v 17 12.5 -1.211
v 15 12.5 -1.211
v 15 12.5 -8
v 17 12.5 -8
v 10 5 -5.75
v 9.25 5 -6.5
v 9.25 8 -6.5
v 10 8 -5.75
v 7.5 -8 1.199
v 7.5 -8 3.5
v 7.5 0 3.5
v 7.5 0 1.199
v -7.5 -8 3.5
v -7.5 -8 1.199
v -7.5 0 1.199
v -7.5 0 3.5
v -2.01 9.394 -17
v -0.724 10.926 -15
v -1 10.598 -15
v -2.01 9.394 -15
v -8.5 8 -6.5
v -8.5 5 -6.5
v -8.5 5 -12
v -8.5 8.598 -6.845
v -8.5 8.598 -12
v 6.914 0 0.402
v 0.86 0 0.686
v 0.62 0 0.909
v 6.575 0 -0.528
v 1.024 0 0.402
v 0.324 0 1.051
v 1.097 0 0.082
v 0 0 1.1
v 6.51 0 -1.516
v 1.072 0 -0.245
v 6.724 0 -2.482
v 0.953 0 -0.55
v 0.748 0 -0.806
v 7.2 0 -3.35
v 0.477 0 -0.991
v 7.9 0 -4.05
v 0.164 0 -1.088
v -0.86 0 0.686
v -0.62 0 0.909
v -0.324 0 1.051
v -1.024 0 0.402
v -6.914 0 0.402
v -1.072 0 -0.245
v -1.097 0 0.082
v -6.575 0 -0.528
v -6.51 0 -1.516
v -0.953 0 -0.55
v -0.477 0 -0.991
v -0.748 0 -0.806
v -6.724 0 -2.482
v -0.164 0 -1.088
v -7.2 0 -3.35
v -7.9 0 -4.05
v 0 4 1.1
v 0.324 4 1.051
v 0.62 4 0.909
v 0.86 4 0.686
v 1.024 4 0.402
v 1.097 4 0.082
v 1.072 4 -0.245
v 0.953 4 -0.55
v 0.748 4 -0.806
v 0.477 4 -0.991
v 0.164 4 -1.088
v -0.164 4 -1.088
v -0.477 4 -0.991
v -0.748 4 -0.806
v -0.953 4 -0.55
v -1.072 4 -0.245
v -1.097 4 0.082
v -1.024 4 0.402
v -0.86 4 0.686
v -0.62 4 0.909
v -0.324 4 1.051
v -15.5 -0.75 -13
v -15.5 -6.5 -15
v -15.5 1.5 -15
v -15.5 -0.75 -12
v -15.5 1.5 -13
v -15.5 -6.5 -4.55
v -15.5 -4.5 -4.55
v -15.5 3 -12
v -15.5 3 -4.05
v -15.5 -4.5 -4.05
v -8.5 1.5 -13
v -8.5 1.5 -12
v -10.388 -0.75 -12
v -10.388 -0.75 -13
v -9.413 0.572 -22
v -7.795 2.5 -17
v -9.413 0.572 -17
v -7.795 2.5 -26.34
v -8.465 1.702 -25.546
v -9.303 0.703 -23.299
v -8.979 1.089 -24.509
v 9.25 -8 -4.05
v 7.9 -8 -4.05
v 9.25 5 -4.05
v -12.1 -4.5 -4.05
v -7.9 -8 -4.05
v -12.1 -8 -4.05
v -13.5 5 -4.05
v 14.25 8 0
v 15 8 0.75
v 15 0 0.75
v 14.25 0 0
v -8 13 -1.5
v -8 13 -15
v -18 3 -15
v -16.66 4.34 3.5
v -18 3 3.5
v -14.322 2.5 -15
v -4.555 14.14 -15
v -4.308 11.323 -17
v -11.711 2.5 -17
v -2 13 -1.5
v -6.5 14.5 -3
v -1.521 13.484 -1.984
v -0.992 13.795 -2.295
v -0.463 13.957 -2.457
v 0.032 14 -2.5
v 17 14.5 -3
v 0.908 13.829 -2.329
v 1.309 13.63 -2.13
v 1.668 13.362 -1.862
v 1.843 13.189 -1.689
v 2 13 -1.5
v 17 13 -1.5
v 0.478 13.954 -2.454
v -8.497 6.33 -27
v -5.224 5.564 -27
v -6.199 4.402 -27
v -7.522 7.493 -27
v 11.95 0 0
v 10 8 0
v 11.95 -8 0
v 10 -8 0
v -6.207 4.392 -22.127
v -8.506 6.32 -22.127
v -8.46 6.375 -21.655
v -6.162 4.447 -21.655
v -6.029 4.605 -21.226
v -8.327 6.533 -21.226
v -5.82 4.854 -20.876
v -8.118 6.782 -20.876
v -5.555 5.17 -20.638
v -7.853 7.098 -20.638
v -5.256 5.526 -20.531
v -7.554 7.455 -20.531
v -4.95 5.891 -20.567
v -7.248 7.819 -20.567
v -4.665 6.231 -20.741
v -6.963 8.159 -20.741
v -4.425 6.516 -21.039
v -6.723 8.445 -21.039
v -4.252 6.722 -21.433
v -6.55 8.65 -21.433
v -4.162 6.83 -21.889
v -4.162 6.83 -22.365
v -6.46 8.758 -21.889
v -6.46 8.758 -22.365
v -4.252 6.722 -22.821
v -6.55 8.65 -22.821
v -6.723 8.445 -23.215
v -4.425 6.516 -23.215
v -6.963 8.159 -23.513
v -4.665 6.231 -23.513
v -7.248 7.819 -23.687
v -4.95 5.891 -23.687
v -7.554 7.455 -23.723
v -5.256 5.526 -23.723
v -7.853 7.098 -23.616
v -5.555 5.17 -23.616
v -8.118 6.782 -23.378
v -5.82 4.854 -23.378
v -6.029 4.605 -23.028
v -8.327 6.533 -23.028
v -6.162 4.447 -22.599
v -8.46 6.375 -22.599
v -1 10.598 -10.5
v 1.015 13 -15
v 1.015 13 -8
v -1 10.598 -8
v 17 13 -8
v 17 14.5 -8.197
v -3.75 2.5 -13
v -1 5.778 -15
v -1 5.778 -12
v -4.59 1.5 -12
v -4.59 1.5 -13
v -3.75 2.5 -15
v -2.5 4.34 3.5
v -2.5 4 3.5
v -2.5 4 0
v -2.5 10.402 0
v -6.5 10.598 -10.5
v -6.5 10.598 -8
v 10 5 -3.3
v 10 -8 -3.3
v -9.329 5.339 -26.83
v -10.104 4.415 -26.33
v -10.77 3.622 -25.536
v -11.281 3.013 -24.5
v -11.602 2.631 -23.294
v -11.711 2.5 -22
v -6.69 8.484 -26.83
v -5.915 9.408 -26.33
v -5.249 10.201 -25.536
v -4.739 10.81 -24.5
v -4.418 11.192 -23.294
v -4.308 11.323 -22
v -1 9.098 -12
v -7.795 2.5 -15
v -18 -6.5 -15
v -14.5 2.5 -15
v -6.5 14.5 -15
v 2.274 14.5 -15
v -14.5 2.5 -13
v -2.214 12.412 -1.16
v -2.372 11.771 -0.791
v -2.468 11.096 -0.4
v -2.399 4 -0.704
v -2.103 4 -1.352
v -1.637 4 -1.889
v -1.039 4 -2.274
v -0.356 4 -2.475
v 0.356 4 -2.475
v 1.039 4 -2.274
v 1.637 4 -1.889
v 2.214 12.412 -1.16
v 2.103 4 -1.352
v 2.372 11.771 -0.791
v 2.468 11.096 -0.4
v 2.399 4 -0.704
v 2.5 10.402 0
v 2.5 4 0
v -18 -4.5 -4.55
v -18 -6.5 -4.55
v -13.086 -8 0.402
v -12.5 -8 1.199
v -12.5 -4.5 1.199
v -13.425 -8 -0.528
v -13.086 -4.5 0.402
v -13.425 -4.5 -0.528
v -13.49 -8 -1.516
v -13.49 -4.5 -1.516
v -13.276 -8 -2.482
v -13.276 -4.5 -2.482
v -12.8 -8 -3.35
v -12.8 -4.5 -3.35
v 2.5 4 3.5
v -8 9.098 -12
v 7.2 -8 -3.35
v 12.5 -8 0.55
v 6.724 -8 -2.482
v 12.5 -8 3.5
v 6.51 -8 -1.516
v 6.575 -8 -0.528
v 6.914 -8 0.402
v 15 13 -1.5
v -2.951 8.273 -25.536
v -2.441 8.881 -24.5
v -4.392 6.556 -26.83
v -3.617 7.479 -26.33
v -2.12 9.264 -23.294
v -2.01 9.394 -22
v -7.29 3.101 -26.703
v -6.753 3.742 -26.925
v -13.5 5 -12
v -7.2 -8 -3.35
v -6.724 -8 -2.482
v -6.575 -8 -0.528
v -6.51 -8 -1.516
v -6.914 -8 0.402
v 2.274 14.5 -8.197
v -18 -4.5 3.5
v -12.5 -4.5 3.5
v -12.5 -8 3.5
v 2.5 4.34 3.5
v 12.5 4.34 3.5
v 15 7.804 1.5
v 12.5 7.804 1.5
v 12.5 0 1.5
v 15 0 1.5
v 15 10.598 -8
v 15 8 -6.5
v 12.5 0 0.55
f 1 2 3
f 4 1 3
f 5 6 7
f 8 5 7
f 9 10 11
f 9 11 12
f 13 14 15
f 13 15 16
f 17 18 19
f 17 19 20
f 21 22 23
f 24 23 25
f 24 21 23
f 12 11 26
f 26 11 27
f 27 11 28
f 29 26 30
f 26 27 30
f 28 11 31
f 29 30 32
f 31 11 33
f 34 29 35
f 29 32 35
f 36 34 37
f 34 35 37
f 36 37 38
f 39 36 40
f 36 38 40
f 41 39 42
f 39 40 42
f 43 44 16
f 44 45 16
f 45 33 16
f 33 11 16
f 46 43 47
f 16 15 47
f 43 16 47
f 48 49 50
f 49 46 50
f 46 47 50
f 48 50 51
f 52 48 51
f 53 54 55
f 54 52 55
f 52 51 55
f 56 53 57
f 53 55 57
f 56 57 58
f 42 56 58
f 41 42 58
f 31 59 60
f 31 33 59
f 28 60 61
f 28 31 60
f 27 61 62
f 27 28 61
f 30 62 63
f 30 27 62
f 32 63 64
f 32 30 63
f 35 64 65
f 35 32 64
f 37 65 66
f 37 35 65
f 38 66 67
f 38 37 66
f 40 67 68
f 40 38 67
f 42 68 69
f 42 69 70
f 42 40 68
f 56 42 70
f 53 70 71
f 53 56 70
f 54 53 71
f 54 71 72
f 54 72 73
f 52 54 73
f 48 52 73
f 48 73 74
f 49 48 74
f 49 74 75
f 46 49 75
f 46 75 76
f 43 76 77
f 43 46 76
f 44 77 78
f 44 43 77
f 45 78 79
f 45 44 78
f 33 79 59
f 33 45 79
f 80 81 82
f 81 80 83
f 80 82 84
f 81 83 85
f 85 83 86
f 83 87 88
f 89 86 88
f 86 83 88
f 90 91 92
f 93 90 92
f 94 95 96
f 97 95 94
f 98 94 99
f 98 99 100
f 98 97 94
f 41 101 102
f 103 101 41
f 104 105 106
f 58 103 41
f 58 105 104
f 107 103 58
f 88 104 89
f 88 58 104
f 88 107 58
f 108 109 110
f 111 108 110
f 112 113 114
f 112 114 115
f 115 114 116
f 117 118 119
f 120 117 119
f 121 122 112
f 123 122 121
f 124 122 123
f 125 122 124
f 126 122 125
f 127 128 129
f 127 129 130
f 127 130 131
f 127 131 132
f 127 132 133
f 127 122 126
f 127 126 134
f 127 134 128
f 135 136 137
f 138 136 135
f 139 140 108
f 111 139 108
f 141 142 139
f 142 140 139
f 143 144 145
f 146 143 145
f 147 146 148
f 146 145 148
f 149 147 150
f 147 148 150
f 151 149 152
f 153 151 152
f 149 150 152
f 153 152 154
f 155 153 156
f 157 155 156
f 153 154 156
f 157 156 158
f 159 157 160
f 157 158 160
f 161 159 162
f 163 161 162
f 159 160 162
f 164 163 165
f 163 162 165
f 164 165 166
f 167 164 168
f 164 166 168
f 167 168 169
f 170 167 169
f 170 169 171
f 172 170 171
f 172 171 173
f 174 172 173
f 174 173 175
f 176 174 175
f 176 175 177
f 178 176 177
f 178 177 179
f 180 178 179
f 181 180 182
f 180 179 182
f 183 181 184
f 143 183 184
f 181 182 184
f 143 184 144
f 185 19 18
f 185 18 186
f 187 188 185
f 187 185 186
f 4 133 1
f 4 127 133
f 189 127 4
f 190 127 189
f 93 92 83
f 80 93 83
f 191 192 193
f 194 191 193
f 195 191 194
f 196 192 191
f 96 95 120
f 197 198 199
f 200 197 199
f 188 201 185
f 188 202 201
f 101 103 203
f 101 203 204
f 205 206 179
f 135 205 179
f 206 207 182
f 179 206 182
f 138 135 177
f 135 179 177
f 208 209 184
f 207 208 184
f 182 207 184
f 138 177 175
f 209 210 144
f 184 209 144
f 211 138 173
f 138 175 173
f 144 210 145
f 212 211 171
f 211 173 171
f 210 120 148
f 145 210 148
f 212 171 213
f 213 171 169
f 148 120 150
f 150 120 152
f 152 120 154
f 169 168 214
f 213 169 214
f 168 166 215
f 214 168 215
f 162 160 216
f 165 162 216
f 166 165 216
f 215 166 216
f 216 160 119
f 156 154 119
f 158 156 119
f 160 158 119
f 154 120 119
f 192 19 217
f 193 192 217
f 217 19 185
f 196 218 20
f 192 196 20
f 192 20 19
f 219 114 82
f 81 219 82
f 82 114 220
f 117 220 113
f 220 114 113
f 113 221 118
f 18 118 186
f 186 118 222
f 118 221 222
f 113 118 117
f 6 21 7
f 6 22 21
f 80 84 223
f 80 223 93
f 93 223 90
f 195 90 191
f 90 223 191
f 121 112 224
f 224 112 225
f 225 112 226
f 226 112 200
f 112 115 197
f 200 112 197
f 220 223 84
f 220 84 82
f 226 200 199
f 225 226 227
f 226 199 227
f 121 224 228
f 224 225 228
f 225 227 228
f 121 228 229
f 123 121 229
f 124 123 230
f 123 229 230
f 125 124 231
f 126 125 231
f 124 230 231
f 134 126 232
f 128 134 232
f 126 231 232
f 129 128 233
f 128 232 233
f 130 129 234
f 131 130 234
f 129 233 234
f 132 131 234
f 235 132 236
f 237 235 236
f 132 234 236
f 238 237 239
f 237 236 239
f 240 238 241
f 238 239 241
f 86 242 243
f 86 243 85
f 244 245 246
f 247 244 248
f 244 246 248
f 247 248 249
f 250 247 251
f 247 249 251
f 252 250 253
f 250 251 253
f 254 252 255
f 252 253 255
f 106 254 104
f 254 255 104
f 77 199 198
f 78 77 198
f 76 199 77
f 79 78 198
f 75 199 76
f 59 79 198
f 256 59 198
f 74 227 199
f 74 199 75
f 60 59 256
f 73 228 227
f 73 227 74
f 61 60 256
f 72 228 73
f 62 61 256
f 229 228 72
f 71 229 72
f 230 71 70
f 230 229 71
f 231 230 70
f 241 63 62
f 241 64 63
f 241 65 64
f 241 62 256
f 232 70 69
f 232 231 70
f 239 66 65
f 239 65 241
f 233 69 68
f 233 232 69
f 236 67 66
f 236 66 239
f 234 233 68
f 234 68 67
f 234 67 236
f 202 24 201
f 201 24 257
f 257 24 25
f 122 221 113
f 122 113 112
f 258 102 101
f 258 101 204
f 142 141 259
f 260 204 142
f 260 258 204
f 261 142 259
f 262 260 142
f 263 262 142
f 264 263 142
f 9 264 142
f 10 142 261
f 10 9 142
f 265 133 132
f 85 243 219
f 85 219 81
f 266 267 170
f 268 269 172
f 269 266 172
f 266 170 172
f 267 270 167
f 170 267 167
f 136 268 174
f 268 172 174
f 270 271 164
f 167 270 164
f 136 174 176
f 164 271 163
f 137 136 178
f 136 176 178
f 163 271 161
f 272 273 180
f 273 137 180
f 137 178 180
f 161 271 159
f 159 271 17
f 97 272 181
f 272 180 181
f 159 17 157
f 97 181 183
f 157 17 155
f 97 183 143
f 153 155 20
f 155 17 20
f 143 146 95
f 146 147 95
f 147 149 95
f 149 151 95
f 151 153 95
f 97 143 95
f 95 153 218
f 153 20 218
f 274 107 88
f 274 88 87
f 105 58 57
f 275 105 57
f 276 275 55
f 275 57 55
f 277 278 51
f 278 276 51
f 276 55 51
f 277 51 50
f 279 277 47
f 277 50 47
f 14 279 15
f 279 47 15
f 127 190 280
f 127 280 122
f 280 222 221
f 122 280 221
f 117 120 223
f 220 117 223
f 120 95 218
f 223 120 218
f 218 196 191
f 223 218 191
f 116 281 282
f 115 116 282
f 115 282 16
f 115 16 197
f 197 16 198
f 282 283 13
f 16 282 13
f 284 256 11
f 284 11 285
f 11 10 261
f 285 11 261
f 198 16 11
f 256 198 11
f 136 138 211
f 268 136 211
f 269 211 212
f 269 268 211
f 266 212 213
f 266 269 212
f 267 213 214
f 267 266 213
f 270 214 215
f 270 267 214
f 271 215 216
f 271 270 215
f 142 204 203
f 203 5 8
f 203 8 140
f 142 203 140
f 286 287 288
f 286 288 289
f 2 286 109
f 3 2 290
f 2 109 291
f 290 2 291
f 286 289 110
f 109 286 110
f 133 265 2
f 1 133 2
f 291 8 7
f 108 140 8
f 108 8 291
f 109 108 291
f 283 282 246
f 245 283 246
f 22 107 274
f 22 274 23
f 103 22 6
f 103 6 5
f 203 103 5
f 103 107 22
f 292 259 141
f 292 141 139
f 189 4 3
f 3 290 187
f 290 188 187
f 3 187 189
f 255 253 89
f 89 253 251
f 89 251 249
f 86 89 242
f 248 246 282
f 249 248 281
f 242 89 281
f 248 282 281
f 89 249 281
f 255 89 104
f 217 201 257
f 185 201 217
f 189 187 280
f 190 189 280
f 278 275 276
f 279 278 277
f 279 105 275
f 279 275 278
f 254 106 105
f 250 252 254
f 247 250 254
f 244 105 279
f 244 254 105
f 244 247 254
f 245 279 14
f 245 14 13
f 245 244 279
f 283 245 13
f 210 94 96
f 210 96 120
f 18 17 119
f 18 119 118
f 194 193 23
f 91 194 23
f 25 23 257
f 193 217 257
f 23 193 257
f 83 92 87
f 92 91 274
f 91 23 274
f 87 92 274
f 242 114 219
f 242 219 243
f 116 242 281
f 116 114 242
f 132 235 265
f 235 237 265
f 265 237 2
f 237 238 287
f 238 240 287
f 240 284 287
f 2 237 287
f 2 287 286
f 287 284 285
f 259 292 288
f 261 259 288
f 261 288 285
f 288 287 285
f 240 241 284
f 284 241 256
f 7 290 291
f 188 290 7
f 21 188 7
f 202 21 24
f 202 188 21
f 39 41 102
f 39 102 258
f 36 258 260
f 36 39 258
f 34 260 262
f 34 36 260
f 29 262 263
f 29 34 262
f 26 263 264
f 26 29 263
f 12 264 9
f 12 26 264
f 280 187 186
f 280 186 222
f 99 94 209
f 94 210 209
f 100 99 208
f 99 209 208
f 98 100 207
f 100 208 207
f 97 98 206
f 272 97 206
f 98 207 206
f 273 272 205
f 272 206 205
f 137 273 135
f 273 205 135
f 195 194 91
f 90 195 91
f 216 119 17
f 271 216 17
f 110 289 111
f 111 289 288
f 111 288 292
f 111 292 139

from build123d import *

# Parameters (mm, degrees)
SKETCH_1_W                      = 28
SKETCH_1_H                      = 11.5
SKETCH_1_R                      = 1.1
EXTRUDE_1_DEPTH                 = 3
SKETCH_2_R                      = 3.5
EXTRUDE_2_DEPTH                 = 8
CUT_EXTRUDE_1_DEPTH             = 22.260291625
CUT_EXTRUDE_1_DEPTH_BACK        = 22.260291625
SKETCH_3_W                      = 25.5
SKETCH_3_H                      = 3.95
EXTRUDE_3_DEPTH                 = 3
SKETCH_5_W                      = 3.5
SKETCH_5_H                      = 3
EXTRUDE_4_DEPTH                 = 2
EXTRUDE_5_DEPTH                 = 5
EXTRUDE_6_DEPTH                 = 5
SKETCH_8_W                      = 25.5
SKETCH_8_H                      = 3.95
EXTRUDE_7_DEPTH                 = 3
EXTRUDE_8_DEPTH                 = 4.5
SKETCH_10_W                     = 2.5
SKETCH_10_H                     = 17.5
EXTRUDE_9_DEPTH                 = 7
SKETCH_11_W                     = 25.5
SKETCH_11_H                     = 1.5
CUT_EXTRUDE_2_DEPTH             = 3
CHAMFER_1_SIZE                  = 1.5
CHAMFER_1_SIZE2                 = 2.598076211
EXTRUDE_10_REACH                = 31.245
EXTRUDE_10_DIRECTION_2_REACH    = 31.245
SKETCH_13_W                     = 3.5
SKETCH_13_H                     = 8
CUT_EXTRUDE_3_DEPTH             = 0.3
CHAMFER_2_SIZE                  = 0.75
SKETCH_14_W                     = 2.5
SKETCH_14_H                     = 2
CUT_EXTRUDE_4_DEPTH             = 30.244657632
CUT_EXTRUDE_4_DIRECTION_2_REACH = 31.245
CUT_EXTRUDE_5_REACH             = 29.663
SKETCH_15_W                     = 2.5
SKETCH_15_H                     = 8
SKETCH_16_R                     = 1.1
EXTRUDE_11_DEPTH                = 1
EXTRUDE_12_DEPTH                = 8.5
SKETCH_20_W                     = 7.5
SKETCH_20_H                     = 3
EXTRUDE_14_DEPTH                = 5.598076211
EXTRUDE_15_DEPTH                = 3
CUT_EXTRUDE_6_DEPTH             = 2
SKETCH_24_W                     = 2.5
SKETCH_24_H                     = 10.45
EXTRUDE_16_DEPTH                = 2
CUT_EXTRUDE_7_REACH             = 29.663
SKETCH_25_W                     = 13.241350553
SKETCH_25_H                     = 2
CHAMFER_3_SIZE                  = 1.5
CHAMFER_5_SIZE                  = 5
CHAMFER_5_SIZE2                 = 8.660254038
CHAMFER_6_SIZE                  = 10
CHAMFER_7_SIZE                  = 2
CHAMFER_8_SIZE                  = 2
EXTRUDE_17_DEPTH                = 1.5
EXTRUDE_21_DEPTH                = 2
EXTRUDE_18_DEPTH                = 2
CHAMFER_9_SIZE                  = 1.5
EXTRUDE_19_DEPTH                = 15.984546635
EXTRUDE_20_REACH                = 31.606
CUT_EXTRUDE_8_REACH             = 31.606
EXTRUDE_22_DEPTH                = 12
SKETCH_36_R                     = 1.6
CUT_EXTRUDE_9_DEPTH             = 3
EXTRUDE_23_DEPTH                = 10
FILLET_1_R                      = 5


# Some blends are built 0.0001 mm under size
with BuildPart() as part:
    # 草图1 → 凸台-拉伸1 (new body)
    with BuildSketch(Plane(origin=(0, 0, 0), x_dir=(1, 0, 0), z_dir=(0, 1, 0))):
        with Locations((-4, 2.25)):
            Rectangle(SKETCH_1_W, SKETCH_1_H)
        with Locations(Location((0, 0, 0), (0, 0, 270))):
            Circle(SKETCH_1_R, mode=Mode.SUBTRACT)
    extrude(amount=EXTRUDE_1_DEPTH)

    # 草图2 → 凸台-拉伸2 (add)
    with BuildSketch(Plane.XZ):
        with Locations(Location((-10, -1.25, 0), (0, 0, 90))):
            Circle(SKETCH_2_R)
        with BuildLine():
            Line((10, 2.25), (10, -4.75))
            ThreePointArc((10, -4.75), (6.5, -1.25), (10, 2.25))
        make_face()
    extrude(amount=EXTRUDE_2_DEPTH)

    # 草图3 → 切除-拉伸1 (cut, two sides: drawn at the far end of the back side and taken through both)
    with BuildSketch(Plane.XZ.offset(-CUT_EXTRUDE_1_DEPTH_BACK)):
        with Locations((-2.75, -6.025)):
            Rectangle(SKETCH_3_W, SKETCH_3_H)
    extrude(amount=CUT_EXTRUDE_1_DEPTH + CUT_EXTRUDE_1_DEPTH_BACK, mode=Mode.SUBTRACT)

    # 草图4 → 凸台-拉伸3 (add)
    with BuildSketch(Plane(origin=(10, 0, 0), x_dir=(0, 0, -1), z_dir=(1, 0, 0))):
        Polygon((0, 3), (0, -8), (-2.25, -8), (-2.25, 0), (-3.5, 0), (-3.5, 3), align=None)
    extrude(amount=EXTRUDE_3_DEPTH)

    # 草图5 → 凸台-拉伸4 (add)
    with BuildSketch(Plane(origin=(13, 0, 0), x_dir=(0, 0, -1), z_dir=(1, 0, 0))):
        with Locations((-1.75, 1.5)):
            Rectangle(SKETCH_5_W, SKETCH_5_H)
    extrude(amount=EXTRUDE_4_DEPTH)

    # 草图6 → 凸台-拉伸5 (add)
    with BuildSketch(Plane(origin=(0, 3, 0), x_dir=(1, 0, 0), z_dir=(0, 1, 0))):
        with BuildLine():
            Line((-2.5, 0), (-2.5, -3.5))
            Line((-2.5, -3.5), (-18, -3.5))
            Line((-18, -3.5), (-18, 8))
            Line((-18, 8), (-15.5, 8))
            Line((-15.5, 8), (-15.5, 4.05))
            Line((-15.5, 4.05), (10, 4.05))
            Line((10, 4.05), (10, 0))
            Line((10, 0), (15, 0))
            Line((15, 0), (15, -3.5))
            Line((15, -3.5), (2.5, -3.5))
            Line((2.5, -3.5), (2.5, 0))
            ThreePointArc((2.5, 0), (0, 2.5), (-2.5, 0))
        make_face()
    extrude(amount=EXTRUDE_5_DEPTH)

    # 草图7 → 凸台-拉伸6 (add)
    with BuildSketch(Plane(origin=(0, 8, 0), x_dir=(1, 0, 0), z_dir=(0, 1, 0))):
        with BuildLine():
            Line((10, 0), (10, 4.05))
            Line((10, 4.05), (-15.5, 4.05))
            Line((-15.5, 4.05), (-15.5, 8))
            Line((-15.5, 8), (-18, 8))
            Line((-18, 8), (-18, -3.5))
            Line((-18, -3.5), (-2.5, -3.5))
            Line((-2.5, -3.5), (-2.5, 0))
            ThreePointArc((-2.5, 0), (0, 2.5), (2.5, 0))
            Line((2.5, 0), (2.5, -3.5))
            Line((2.5, -3.5), (15, -3.5))
            Line((15, -3.5), (15, 0))
            Line((15, 0), (10, 0))
        make_face()
        Polygon((10, 0), (15, 0), (15, 8), (-15.5, 8), (-15.5, 4.05), (10, 4.05), align=None)
    extrude(amount=EXTRUDE_6_DEPTH)

    # 草图8 → 凸台-拉伸7 (add)
    with BuildSketch(Plane.XZ.offset(-8)):
        with Locations((-2.75, -6.025)):
            Rectangle(SKETCH_8_W, SKETCH_8_H)
    extrude(amount=EXTRUDE_7_DEPTH)

    # 草图9 → 凸台-拉伸8 (add)
    with BuildSketch(Plane.XZ):
        with BuildLine():
            Line((-12.1, -4.05), (-15.5, -4.05))
            Line((-15.5, -4.05), (-15.5, -8))
            Line((-15.5, -8), (-18, -8))
            Line((-18, -8), (-18, -4.05))
            Line((-18, -4.05), (-18, 3.5))
            Line((-18, 3.5), (-7.5, 3.5))
            Line((-7.5, 3.5), (-7.5, 1.199489743))
            ThreePointArc((-7.5, 1.199489743), (-12.632353631, 1.056667371), (-12.1, -4.05))
        make_face()
    extrude(amount=EXTRUDE_8_DEPTH)

    # 草图10 → 凸台-拉伸9 (add)
    with BuildSketch(Plane(origin=(0, 0, -8), x_dir=(-1, 0, 0), z_dir=(0, 0, -1))):
        with Locations((16.75, 4.25)):
            Rectangle(SKETCH_10_W, SKETCH_10_H)
    extrude(amount=EXTRUDE_9_DEPTH)

    # 草图11 → 切除-拉伸2 (cut)
    with BuildSketch(Plane.XZ.offset(-5)):
        with Locations((-2.75, -7.25)):
            Rectangle(SKETCH_11_W, SKETCH_11_H)
    extrude(amount=-CUT_EXTRUDE_2_DEPTH, mode=Mode.SUBTRACT)

    # 倒角1
    chamfer_1_edges = [part.edges().sort_by_distance(p)[0] for p in [
        (-0.25, 8, -8),
    ]]
    chamfer_1_side = [part.faces().sort_by_distance(p)[0] for p in [
        (-15.184682699, 8, -7.25),
    ]]
    chamfer(chamfer_1_edges, length=CHAMFER_1_SIZE, length2=CHAMFER_1_SIZE2, reference=chamfer_1_side[0])

    # 凸台-拉伸10: up to this face of the body (flat: up to its plane)
    extrude_10_end = Plane(part.part.faces().sort_by_distance((-10, -8, -1.080764101))[0])
    # 草图12 → 凸台-拉伸10 (add, up to the picked face)
    with BuildSketch(Plane.XZ.offset(4.5), mode=Mode.PRIVATE) as extrude_10_sk1:
        with BuildLine():
            Line((-12.5, 3.5), (-12.5, 1.199489743))
            ThreePointArc((-12.5, 1.199489743), (-10, 2.25), (-7.5, 1.199489743))
            Line((-7.5, 1.199489743), (-7.5, 3.5))
            Line((-7.5, 3.5), (-12.5, 3.5))
        make_face()
    extrude_10_tool1 = split(extrude(extrude_10_sk1.sketch, amount=EXTRUDE_10_REACH, mode=Mode.PRIVATE), bisect_by=extrude_10_end, keep=Keep.BOTH, mode=Mode.PRIVATE)
    # 草图12 → 凸台-拉伸10 (add, up to the picked face)
    with BuildSketch(Plane.XZ.offset(4.5), mode=Mode.PRIVATE) as extrude_10_sk2:
        with BuildLine():
            Line((7.5, 3.5), (7.5, 1.199489743))
            ThreePointArc((7.5, 1.199489743), (8.644126499, 1.976702194), (10, 2.25))
            Line((10, 2.25), (12.5, 2.25))
            Line((12.5, 2.25), (13, 2.25))
            Line((13, 2.25), (13, 3.5))
            Line((13, 3.5), (12.5, 3.5))
            Line((12.5, 3.5), (7.5, 3.5))
        make_face()
    extrude_10_tool2 = split(extrude(extrude_10_sk2.sketch, amount=EXTRUDE_10_REACH, mode=Mode.PRIVATE), bisect_by=extrude_10_end, keep=Keep.BOTH, mode=Mode.PRIVATE)
    add(extrude_10_tool1.solids().sort_by(Axis((-10, -4.5, 2.682619), (0, -1, 0)))[0])
    add(extrude_10_tool2.solids().sort_by(Axis((10.022618, -4.5, 2.776432), (0, -1, 0)))[0])

    # 凸台-拉伸10 direction 2: up to this face of the body (flat: up to its plane)
    extrude_10_direction_2_end = Plane(part.part.faces().sort_by_distance((1.489654817, 0, 0.088188875))[0])
    # 草图12 → 凸台-拉伸10 direction 2 (add, up to the picked face)
    with BuildSketch(Plane.XZ.offset(4.5), mode=Mode.PRIVATE) as extrude_10_direction_2_sk1:
        with BuildLine():
            Line((-12.5, 3.5), (-12.5, 1.199489743))
            ThreePointArc((-12.5, 1.199489743), (-10, 2.25), (-7.5, 1.199489743))
            Line((-7.5, 1.199489743), (-7.5, 3.5))
            Line((-7.5, 3.5), (-12.5, 3.5))
        make_face()
    extrude_10_direction_2_tool1 = split(extrude(extrude_10_direction_2_sk1.sketch, amount=-EXTRUDE_10_DIRECTION_2_REACH, mode=Mode.PRIVATE), bisect_by=extrude_10_direction_2_end, keep=Keep.BOTH, mode=Mode.PRIVATE)
    # 草图12 → 凸台-拉伸10 direction 2 (add, up to the picked face)
    with BuildSketch(Plane.XZ.offset(4.5), mode=Mode.PRIVATE) as extrude_10_direction_2_sk2:
        with BuildLine():
            Line((7.5, 3.5), (7.5, 1.199489743))
            ThreePointArc((7.5, 1.199489743), (8.644126499, 1.976702194), (10, 2.25))
            Line((10, 2.25), (12.5, 2.25))
            Line((12.5, 2.25), (13, 2.25))
            Line((13, 2.25), (13, 3.5))
            Line((13, 3.5), (12.5, 3.5))
            Line((12.5, 3.5), (7.5, 3.5))
        make_face()
    extrude_10_direction_2_tool2 = split(extrude(extrude_10_direction_2_sk2.sketch, amount=-EXTRUDE_10_DIRECTION_2_REACH, mode=Mode.PRIVATE), bisect_by=extrude_10_direction_2_end, keep=Keep.BOTH, mode=Mode.PRIVATE)
    add(extrude_10_direction_2_tool1.solids().sort_by(Axis((-10, -4.5, 2.682619), (0, 1, 0)))[0])
    add(extrude_10_direction_2_tool2.solids().sort_by(Axis((10.022618, -4.5, 2.776432), (0, 1, 0)))[0])

    # 草图13 → 切除-拉伸3 (cut)
    with BuildSketch(Plane(origin=(13, 0, 0), x_dir=(0, 0, -1), z_dir=(1, 0, 0))):
        with Locations((-1.75, -4)):
            Rectangle(SKETCH_13_W, SKETCH_13_H)
    extrude(amount=-CUT_EXTRUDE_3_DEPTH, mode=Mode.SUBTRACT)

    # 倒角2
    chamfer_2_edges = [part.edges().sort_by_distance(p)[0] for p in [
        (10, -1.5, -4.05),
        (10, 6.5, -6.5),
        (12.7, -4, 0),
        (15, 4, 0),
    ]]
    chamfer(chamfer_2_edges, length=CHAMFER_2_SIZE)

    # 草图14 → 切除-拉伸4 (cut)
    with BuildSketch(Plane.XZ.offset(4.5)):
        with Locations((13.75, 2.5)):
            Rectangle(SKETCH_14_W, SKETCH_14_H)
    extrude(amount=-CUT_EXTRUDE_4_DEPTH, mode=Mode.SUBTRACT)

    # 草图14 → 切除-拉伸4 direction 2 (cut, up to next)
    with BuildSketch(Plane.XZ.offset(4.5), mode=Mode.PRIVATE) as cut_extrude_4_direction_2_sk1:
        with Locations((13.75, 2.5)):
            Rectangle(SKETCH_14_W, SKETCH_14_H)
    cut_extrude_4_direction_2_tool1 = extrude(cut_extrude_4_direction_2_sk1.sketch, amount=CUT_EXTRUDE_4_DIRECTION_2_REACH, mode=Mode.PRIVATE) & part.part
    add(cut_extrude_4_direction_2_tool1.solids().sort_by_distance((13.75, -4.5, 2.5))[0], mode=Mode.SUBTRACT)

    # 草图15 → 切除-拉伸5 (cut, up to next)
    with BuildSketch(Plane.XY.offset(1.5), mode=Mode.PRIVATE) as cut_extrude_5_sk1:
        with Locations((13.75, -4)):
            Rectangle(SKETCH_15_W, SKETCH_15_H)
    cut_extrude_5_tool1 = extrude(cut_extrude_5_sk1.sketch, amount=-CUT_EXTRUDE_5_REACH, mode=Mode.PRIVATE) & part.part
    add(cut_extrude_5_tool1.solids().sort_by_distance((13.75, -4, 1.5))[0], mode=Mode.SUBTRACT)

    # 草图16 → 凸台-拉伸11 (add)
    with BuildSketch(Plane(origin=(0, 3, 0), x_dir=(1, 0, 0), z_dir=(0, 1, 0))):
        with BuildLine():
            Line((2.5, -3.5), (2.5, 0))
            ThreePointArc((2.5, 0), (0, 2.5), (-2.5, 0))
            Line((-2.5, 0), (-2.5, -3.5))
            Line((-2.5, -3.5), (2.5, -3.5))
        make_face()
        with Locations(Location((0, 0, 0), (0, 0, 270))):
            Circle(SKETCH_16_R, mode=Mode.SUBTRACT)
    extrude(amount=EXTRUDE_11_DEPTH)

    # 草图18 → 凸台-拉伸12 (add)
    with BuildSketch(Plane(origin=(0, 0, -6.5), x_dir=(-1, 0, 0), z_dir=(0, 0, -1))):
        Polygon((15.5, 5), (8.5, 5), (8.5, 10.598076211), (1, 10.598076211), (-1.015453365, 13), (1, 13), (15.5, 13), align=None)
    extrude(amount=EXTRUDE_12_DEPTH)

    # 草图20 → 凸台-拉伸14 (add)
    with BuildSketch(Plane.XZ.offset(-10.598076211)):
        with Locations((-4.75, -13.5)):
            Rectangle(SKETCH_20_W, SKETCH_20_H)
    extrude(amount=EXTRUDE_14_DEPTH)

    # 草图21 → 凸台-拉伸15 (add)
    with BuildSketch(Plane.XY.offset(-12)):
        Polygon((-1, 5), (-3.936848709, 1.5), (-8.5, 1.5), (-10.38797417, -0.75), (-15.5, -0.75), (-15.5, 1.5), (-15.5, 5), align=None)
    extrude(amount=-EXTRUDE_15_DEPTH)

    # 草图23 → 切除-拉伸6 (cut)
    with BuildSketch(Plane(origin=(0, 0, -15), x_dir=(-1, 0, 0), z_dir=(0, 0, -1))):
        Polygon((8.5, 1.5), (15.5, 1.5), (15.5, -0.75), (10.38797417, -0.75), align=None)
    extrude(amount=-CUT_EXTRUDE_6_DEPTH, mode=Mode.SUBTRACT)

    # 草图24 → 凸台-拉伸16 (add)
    with BuildSketch(Plane.XZ.offset(4.5)):
        with Locations((-16.75, -9.775)):
            Rectangle(SKETCH_24_W, SKETCH_24_H)
    extrude(amount=EXTRUDE_16_DEPTH)

    # 草图25 → 切除-拉伸7 (cut, up to next)
    with BuildSketch(Plane(origin=(0, 0, -13), x_dir=(-1, 0, 0), z_dir=(0, 0, -1)), mode=Mode.PRIVATE) as cut_extrude_7_sk1:
        with Locations((8.879324724, 2.5)):
            Rectangle(SKETCH_25_W, SKETCH_25_H)
    cut_extrude_7_tool1 = extrude(cut_extrude_7_sk1.sketch, amount=CUT_EXTRUDE_7_REACH, mode=Mode.PRIVATE) & part.part
    add(cut_extrude_7_tool1.solids().sort_by_distance((-8.879325, 2.5, -13))[0], mode=Mode.SUBTRACT)

    # 倒角3
    chamfer_3_edges = [part.edges().sort_by_distance(p)[0] for p in [
        (-4.75, 10.598076211, -12),
    ]]
    chamfer(chamfer_3_edges, length=CHAMFER_3_SIZE)

    # 倒角5
    chamfer_5_edges = [part.edges().sort_by_distance(p)[0] for p in [
        (-10.25, 13, 3.5),
        (7.5, 13, 3.5),
    ]]
    chamfer_5_side = [part.faces().sort_by_distance(p)[0] for p in [
        (-3.681918062, 13, -5.033050498),
    ]]
    chamfer(chamfer_5_edges, length=CHAMFER_5_SIZE, length2=CHAMFER_5_SIZE2, reference=chamfer_5_side[0])

    # 倒角6
    chamfer_6_edges = [part.edges().sort_by_distance(p)[0] for p in [
        (-18, 13, -8.25),
    ]]
    chamfer(chamfer_6_edges, length=CHAMFER_6_SIZE)

    # 倒角7
    chamfer_7_edges = [part.edges().sort_by_distance(p)[0] for p in [
        (-15.5, 3.5, -14),
    ]]
    chamfer(chamfer_7_edges, length=CHAMFER_7_SIZE)

    # 倒角8
    chamfer_8_edges = [part.edges().sort_by_distance(p)[0] for p in [
        (-15.5, 5, -8.025),
        (-8.5, 10.598076211, -9.25),
    ]]
    chamfer(chamfer_8_edges, length=CHAMFER_8_SIZE)

    # 草图28 → 凸台-拉伸17 (add)
    with BuildSketch(Plane(origin=(0, 13, 0), x_dir=(1, 0, 0), z_dir=(0, 1, 0))):
        with BuildLine():
            Line((1.015453365, 15), (-8, 15))
            Line((-8, 15), (-8, 1.5))
            Line((-8, 1.5), (-2, 1.5))
            ThreePointArc((-2, 1.5), (0, 2.5), (2, 1.5))
            Line((2, 1.5), (15, 1.5))
            Line((15, 1.5), (15, 8))
            Line((15, 8), (1.015453365, 8))
            Line((1.015453365, 8), (1.015453365, 15))
        make_face()
    extrude(amount=EXTRUDE_17_DEPTH)

    # 草图34 → 凸台-拉伸21 (add)
    with BuildSketch(Plane(origin=(0, 0, -13), x_dir=(-1, 0, 0), z_dir=(0, 0, -1))):
        Polygon((2.258649447, 3.5), (3.097749078, 2.5), (14.5, 2.5), (13.5, 3.5), align=None)
    extrude(amount=EXTRUDE_21_DEPTH)

    # 草图29 → 凸台-拉伸18 (add)
    with BuildSketch(Plane(origin=(15, 0, 0), x_dir=(0, 0, -1), z_dir=(1, 0, 0))):
        Polygon((1.5, 14.5), (1.5, 13), (1.211324865, 12.5), (8, 12.5), (8, 14.5), align=None)
    extrude(amount=EXTRUDE_18_DEPTH)

    # 倒角9
    chamfer_9_edges = [part.edges().sort_by_distance(p)[0] for p in [
        (-5, 14.5, -1.5),
        (-8, 14.5, -8.25),
    ]]
    chamfer(chamfer_9_edges, length=CHAMFER_9_SIZE - 0.0001)  # a hair under: the kernel refuses the full size

    # 草图30 → 凸台-拉伸19 (add)
    with BuildSketch(Plane(origin=(1.015453365, 0, 0), x_dir=(0, 0, -1), z_dir=(1, 0, 0))):
        Polygon((8, 13), (8.197478746, 14.5), (8, 14.5), align=None)
    extrude(amount=EXTRUDE_19_DEPTH)

    # 凸台-拉伸20: up to this face of the body (flat: up to its plane)
    extrude_20_end = Plane(part.part.faces().sort_by_distance((9.007726683, 13.75, -8.098739373))[0])
    # 草图32 → 凸台-拉伸20 (add, up to the picked face)
    with BuildSketch(Plane(origin=(0, 0, -15), x_dir=(-1, 0, 0), z_dir=(0, 0, -1)), mode=Mode.PRIVATE) as extrude_20_sk1:
        Polygon((-1.015453365, 13), (-2.274102812, 14.5), (-1.015453365, 14.5), align=None)
    extrude_20_tool1 = split(extrude(extrude_20_sk1.sketch, amount=-EXTRUDE_20_REACH, mode=Mode.PRIVATE), bisect_by=extrude_20_end, keep=Keep.BOTH, mode=Mode.PRIVATE)
    add(extrude_20_tool1.solids().sort_by(Axis((1.435003, 14, -15), (0, 0, 1)))[0])

    # 切除-拉伸8: up to this face of the body (flat: up to its plane)
    cut_extrude_8_end = Plane(part.part.faces().sort_by_distance((-7.893394404, 4.143694153, -12))[0])
    # 草图33 → 切除-拉伸8 (cut, up to the picked face)
    with BuildSketch(Plane(origin=(0, 0, -15), x_dir=(-1, 0, 0), z_dir=(0, 0, -1)), mode=Mode.PRIVATE) as cut_extrude_8_sk1:
        Polygon((1, 5), (1, 5.777861913), (4.589552354, 1.5), (3.936848709, 1.5), align=None)
    cut_extrude_8_tool1 = split(extrude(cut_extrude_8_sk1.sketch, amount=-CUT_EXTRUDE_8_REACH, mode=Mode.PRIVATE), bisect_by=cut_extrude_8_end, keep=Keep.BOTH, mode=Mode.PRIVATE)
    add(cut_extrude_8_tool1.solids().sort_by(Axis((-2.63704, 3.450948, -15), (0, 0, 1)))[0], mode=Mode.SUBTRACT)

    # 草图35 → 凸台-拉伸22 (add)
    with BuildSketch(Plane(origin=(0, 0, -15), x_dir=(-1, 0, 0), z_dir=(0, 0, -1))):
        Polygon((2.010004275, 9.394399988), (7.795092762, 2.5), (11.71131463, 2.5), (4.308137604, 11.322762817), align=None)
    extrude(amount=EXTRUDE_22_DEPTH)

    # 草图36 → 切除-拉伸9 (cut)
    with BuildSketch(Plane(origin=(-8.103491228, 6.799636501, 0), x_dir=(0, 0, 1), z_dir=(-0.7660444431189746, 0.6427876096865437, 0))):
        with Locations(Location((-22.127, 0.974522064, 0), (0, 0, 270))):
            Circle(SKETCH_36_R)
    extrude(amount=-CUT_EXTRUDE_9_DEPTH, mode=Mode.SUBTRACT)

    # 草图37 → 凸台-拉伸23 (add)
    with BuildSketch(Plane(origin=(0, 0, -27), x_dir=(-1, 0, 0), z_dir=(0, 0, -1))):
        Polygon((11.71131463, 2.5), (7.795092762, 2.5), (9.413181301, 0.571637171), align=None)
    extrude(amount=-EXTRUDE_23_DEPTH)

    # 圆角1
    fillet_1_edges = [part.edges().sort_by_distance(p)[0] for p in [
        (-3.15907094, 10.358581403, -27),
        (-10.562247966, 1.535818585, -27),
    ]]
    fillet(fillet_1_edges, radius=FILLET_1_R)

    # 倒角10
    # the kernel refuses this chamfer: 2 mm, written as the material it adds along each edge
    with BuildSketch(Plane(origin=(-4.308137604, 11.322762817, -15), x_dir=(-0.017674008802754975, -0.021063063486224685, -0.9996219169112968), z_dir=(0.7660444431189742, -0.6427876096865438, 0))) as chamfer_10_piece_1:
        with BuildLine():
            Line((2.05734639, 0), (-0.11309431, 2.054235587))
            Line((-0.11309431, 2.054235587), (-0.153079186, 2.053135752))
            ThreePointArc((-0.153079186, 2.053135752), (-0.068258454, 1.026795659), (-0.039984877, -0.001099835))
            Line((-0.039984877, -0.001099835), (0.001099835, -0.039984877))
            ThreePointArc((0.001099835, -0.039984877), (1.028995329, -0.011711299), (2.058446225, -0.039984877))
            Line((2.058446225, -0.039984877), (2.05734639, 0))
        make_face()
    extrude(amount=3)
    with BuildSketch(Plane(origin=(-15.017406552, -1.440046925, -15), x_dir=(-0.765754814669836, 0.642544582561693, 0.02749587661058647), z_dir=(0.6427876096865436, 0.7660444431189746, 0))) as chamfer_10_piece_2_section:
        with BuildLine():
            Line((2.05734639, 0), (-0.11309431, -2.054235587))
            Line((-0.11309431, -2.054235587), (-0.153079186, -2.053135752))
            ThreePointArc((-0.153079186, -2.053135752), (-0.068258454, -1.026795659), (-0.039984877, 0.001099835))
            Line((-0.039984877, 0.001099835), (0.001099835, 0.039984877))
            ThreePointArc((0.001099835, 0.039984877), (1.028995329, 0.011711299), (2.058446225, 0.039984877))
            Line((2.058446225, 0.039984877), (2.05734639, 0))
        make_face()
    chamfer_10_piece_2 = extrude(amount=16.660664869, mode=Mode.PRIVATE)
    chamfer_10_piece_2 = split(chamfer_10_piece_2, bisect_by=Plane(origin=(-8.711166063, 2.5, -15.650147459), z_dir=(0, 1, 0)), keep=Keep.TOP, mode=Mode.PRIVATE)
    add(chamfer_10_piece_2)
    with BuildSketch(Plane(origin=(-8.248184529, 14.628854739, -15), x_dir=(-0.017674008802755155, -0.0210630634862249, -0.9996219169112968), z_dir=(0.7660444431189742, -0.6427876096865438, 0))) as chamfer_10_piece_3a_section:
        with BuildLine():
            Line((2.05734639, 0), (-0.11309431, 2.054235587))
            Line((-0.11309431, 2.054235587), (-0.153079186, 2.053135752))
            ThreePointArc((-0.153079186, 2.053135752), (-0.068258454, 1.026795659), (-0.039984877, -0.001099835))
            Line((-0.039984877, -0.001099835), (0.001099835, -0.039984877))
            ThreePointArc((0.001099835, -0.039984877), (1.028995329, -0.011711299), (2.058446225, -0.039984877))
            Line((2.058446225, -0.039984877), (2.05734639, 0))
        make_face()
    chamfer_10_piece_3a = extrude(amount=8.143365976, mode=Mode.PRIVATE)
    chamfer_10_piece_3a = split(chamfer_10_piece_3a, bisect_by=Plane(origin=(-3.88416309, 11.828035968, -15.659587254), z_dir=(-0.7660444431189746, 0.6427876096865436, 0)), keep=Keep.TOP, mode=Mode.PRIVATE)
    with BuildSketch(Plane(origin=(-15.017406552, -1.440046925, -15), x_dir=(-0.765754814669836, 0.642544582561693, 0.02749587661058647), z_dir=(0.6427876096865436, 0.7660444431189746, 0))) as chamfer_10_piece_3b_section:
        with BuildLine():
            Line((2.05734639, 0), (-0.11309431, -2.054235587))
            Line((-0.11309431, -2.054235587), (-0.153079186, -2.053135752))
            ThreePointArc((-0.153079186, -2.053135752), (-0.068258454, -1.026795659), (-0.039984877, 0.001099835))
            Line((-0.039984877, 0.001099835), (0.001099835, 0.039984877))
            ThreePointArc((0.001099835, 0.039984877), (1.028995329, 0.011711299), (2.058446225, 0.039984877))
            Line((2.058446225, 0.039984877), (2.05734639, 0))
        make_face()
    chamfer_10_piece_3b = extrude(amount=21.804030845, mode=Mode.PRIVATE)
    chamfer_10_piece_3b = split(chamfer_10_piece_3b, bisect_by=Plane(origin=(-4.813410755, 11.746737331, -15.659587254), z_dir=(0.6427876096865439, 0.7660444431189745, 0)), keep=Keep.TOP, mode=Mode.PRIVATE)
    chamfer_10_piece_3 = chamfer_10_piece_3a & chamfer_10_piece_3b
    add(chamfer_10_piece_3)


solid = part.part
